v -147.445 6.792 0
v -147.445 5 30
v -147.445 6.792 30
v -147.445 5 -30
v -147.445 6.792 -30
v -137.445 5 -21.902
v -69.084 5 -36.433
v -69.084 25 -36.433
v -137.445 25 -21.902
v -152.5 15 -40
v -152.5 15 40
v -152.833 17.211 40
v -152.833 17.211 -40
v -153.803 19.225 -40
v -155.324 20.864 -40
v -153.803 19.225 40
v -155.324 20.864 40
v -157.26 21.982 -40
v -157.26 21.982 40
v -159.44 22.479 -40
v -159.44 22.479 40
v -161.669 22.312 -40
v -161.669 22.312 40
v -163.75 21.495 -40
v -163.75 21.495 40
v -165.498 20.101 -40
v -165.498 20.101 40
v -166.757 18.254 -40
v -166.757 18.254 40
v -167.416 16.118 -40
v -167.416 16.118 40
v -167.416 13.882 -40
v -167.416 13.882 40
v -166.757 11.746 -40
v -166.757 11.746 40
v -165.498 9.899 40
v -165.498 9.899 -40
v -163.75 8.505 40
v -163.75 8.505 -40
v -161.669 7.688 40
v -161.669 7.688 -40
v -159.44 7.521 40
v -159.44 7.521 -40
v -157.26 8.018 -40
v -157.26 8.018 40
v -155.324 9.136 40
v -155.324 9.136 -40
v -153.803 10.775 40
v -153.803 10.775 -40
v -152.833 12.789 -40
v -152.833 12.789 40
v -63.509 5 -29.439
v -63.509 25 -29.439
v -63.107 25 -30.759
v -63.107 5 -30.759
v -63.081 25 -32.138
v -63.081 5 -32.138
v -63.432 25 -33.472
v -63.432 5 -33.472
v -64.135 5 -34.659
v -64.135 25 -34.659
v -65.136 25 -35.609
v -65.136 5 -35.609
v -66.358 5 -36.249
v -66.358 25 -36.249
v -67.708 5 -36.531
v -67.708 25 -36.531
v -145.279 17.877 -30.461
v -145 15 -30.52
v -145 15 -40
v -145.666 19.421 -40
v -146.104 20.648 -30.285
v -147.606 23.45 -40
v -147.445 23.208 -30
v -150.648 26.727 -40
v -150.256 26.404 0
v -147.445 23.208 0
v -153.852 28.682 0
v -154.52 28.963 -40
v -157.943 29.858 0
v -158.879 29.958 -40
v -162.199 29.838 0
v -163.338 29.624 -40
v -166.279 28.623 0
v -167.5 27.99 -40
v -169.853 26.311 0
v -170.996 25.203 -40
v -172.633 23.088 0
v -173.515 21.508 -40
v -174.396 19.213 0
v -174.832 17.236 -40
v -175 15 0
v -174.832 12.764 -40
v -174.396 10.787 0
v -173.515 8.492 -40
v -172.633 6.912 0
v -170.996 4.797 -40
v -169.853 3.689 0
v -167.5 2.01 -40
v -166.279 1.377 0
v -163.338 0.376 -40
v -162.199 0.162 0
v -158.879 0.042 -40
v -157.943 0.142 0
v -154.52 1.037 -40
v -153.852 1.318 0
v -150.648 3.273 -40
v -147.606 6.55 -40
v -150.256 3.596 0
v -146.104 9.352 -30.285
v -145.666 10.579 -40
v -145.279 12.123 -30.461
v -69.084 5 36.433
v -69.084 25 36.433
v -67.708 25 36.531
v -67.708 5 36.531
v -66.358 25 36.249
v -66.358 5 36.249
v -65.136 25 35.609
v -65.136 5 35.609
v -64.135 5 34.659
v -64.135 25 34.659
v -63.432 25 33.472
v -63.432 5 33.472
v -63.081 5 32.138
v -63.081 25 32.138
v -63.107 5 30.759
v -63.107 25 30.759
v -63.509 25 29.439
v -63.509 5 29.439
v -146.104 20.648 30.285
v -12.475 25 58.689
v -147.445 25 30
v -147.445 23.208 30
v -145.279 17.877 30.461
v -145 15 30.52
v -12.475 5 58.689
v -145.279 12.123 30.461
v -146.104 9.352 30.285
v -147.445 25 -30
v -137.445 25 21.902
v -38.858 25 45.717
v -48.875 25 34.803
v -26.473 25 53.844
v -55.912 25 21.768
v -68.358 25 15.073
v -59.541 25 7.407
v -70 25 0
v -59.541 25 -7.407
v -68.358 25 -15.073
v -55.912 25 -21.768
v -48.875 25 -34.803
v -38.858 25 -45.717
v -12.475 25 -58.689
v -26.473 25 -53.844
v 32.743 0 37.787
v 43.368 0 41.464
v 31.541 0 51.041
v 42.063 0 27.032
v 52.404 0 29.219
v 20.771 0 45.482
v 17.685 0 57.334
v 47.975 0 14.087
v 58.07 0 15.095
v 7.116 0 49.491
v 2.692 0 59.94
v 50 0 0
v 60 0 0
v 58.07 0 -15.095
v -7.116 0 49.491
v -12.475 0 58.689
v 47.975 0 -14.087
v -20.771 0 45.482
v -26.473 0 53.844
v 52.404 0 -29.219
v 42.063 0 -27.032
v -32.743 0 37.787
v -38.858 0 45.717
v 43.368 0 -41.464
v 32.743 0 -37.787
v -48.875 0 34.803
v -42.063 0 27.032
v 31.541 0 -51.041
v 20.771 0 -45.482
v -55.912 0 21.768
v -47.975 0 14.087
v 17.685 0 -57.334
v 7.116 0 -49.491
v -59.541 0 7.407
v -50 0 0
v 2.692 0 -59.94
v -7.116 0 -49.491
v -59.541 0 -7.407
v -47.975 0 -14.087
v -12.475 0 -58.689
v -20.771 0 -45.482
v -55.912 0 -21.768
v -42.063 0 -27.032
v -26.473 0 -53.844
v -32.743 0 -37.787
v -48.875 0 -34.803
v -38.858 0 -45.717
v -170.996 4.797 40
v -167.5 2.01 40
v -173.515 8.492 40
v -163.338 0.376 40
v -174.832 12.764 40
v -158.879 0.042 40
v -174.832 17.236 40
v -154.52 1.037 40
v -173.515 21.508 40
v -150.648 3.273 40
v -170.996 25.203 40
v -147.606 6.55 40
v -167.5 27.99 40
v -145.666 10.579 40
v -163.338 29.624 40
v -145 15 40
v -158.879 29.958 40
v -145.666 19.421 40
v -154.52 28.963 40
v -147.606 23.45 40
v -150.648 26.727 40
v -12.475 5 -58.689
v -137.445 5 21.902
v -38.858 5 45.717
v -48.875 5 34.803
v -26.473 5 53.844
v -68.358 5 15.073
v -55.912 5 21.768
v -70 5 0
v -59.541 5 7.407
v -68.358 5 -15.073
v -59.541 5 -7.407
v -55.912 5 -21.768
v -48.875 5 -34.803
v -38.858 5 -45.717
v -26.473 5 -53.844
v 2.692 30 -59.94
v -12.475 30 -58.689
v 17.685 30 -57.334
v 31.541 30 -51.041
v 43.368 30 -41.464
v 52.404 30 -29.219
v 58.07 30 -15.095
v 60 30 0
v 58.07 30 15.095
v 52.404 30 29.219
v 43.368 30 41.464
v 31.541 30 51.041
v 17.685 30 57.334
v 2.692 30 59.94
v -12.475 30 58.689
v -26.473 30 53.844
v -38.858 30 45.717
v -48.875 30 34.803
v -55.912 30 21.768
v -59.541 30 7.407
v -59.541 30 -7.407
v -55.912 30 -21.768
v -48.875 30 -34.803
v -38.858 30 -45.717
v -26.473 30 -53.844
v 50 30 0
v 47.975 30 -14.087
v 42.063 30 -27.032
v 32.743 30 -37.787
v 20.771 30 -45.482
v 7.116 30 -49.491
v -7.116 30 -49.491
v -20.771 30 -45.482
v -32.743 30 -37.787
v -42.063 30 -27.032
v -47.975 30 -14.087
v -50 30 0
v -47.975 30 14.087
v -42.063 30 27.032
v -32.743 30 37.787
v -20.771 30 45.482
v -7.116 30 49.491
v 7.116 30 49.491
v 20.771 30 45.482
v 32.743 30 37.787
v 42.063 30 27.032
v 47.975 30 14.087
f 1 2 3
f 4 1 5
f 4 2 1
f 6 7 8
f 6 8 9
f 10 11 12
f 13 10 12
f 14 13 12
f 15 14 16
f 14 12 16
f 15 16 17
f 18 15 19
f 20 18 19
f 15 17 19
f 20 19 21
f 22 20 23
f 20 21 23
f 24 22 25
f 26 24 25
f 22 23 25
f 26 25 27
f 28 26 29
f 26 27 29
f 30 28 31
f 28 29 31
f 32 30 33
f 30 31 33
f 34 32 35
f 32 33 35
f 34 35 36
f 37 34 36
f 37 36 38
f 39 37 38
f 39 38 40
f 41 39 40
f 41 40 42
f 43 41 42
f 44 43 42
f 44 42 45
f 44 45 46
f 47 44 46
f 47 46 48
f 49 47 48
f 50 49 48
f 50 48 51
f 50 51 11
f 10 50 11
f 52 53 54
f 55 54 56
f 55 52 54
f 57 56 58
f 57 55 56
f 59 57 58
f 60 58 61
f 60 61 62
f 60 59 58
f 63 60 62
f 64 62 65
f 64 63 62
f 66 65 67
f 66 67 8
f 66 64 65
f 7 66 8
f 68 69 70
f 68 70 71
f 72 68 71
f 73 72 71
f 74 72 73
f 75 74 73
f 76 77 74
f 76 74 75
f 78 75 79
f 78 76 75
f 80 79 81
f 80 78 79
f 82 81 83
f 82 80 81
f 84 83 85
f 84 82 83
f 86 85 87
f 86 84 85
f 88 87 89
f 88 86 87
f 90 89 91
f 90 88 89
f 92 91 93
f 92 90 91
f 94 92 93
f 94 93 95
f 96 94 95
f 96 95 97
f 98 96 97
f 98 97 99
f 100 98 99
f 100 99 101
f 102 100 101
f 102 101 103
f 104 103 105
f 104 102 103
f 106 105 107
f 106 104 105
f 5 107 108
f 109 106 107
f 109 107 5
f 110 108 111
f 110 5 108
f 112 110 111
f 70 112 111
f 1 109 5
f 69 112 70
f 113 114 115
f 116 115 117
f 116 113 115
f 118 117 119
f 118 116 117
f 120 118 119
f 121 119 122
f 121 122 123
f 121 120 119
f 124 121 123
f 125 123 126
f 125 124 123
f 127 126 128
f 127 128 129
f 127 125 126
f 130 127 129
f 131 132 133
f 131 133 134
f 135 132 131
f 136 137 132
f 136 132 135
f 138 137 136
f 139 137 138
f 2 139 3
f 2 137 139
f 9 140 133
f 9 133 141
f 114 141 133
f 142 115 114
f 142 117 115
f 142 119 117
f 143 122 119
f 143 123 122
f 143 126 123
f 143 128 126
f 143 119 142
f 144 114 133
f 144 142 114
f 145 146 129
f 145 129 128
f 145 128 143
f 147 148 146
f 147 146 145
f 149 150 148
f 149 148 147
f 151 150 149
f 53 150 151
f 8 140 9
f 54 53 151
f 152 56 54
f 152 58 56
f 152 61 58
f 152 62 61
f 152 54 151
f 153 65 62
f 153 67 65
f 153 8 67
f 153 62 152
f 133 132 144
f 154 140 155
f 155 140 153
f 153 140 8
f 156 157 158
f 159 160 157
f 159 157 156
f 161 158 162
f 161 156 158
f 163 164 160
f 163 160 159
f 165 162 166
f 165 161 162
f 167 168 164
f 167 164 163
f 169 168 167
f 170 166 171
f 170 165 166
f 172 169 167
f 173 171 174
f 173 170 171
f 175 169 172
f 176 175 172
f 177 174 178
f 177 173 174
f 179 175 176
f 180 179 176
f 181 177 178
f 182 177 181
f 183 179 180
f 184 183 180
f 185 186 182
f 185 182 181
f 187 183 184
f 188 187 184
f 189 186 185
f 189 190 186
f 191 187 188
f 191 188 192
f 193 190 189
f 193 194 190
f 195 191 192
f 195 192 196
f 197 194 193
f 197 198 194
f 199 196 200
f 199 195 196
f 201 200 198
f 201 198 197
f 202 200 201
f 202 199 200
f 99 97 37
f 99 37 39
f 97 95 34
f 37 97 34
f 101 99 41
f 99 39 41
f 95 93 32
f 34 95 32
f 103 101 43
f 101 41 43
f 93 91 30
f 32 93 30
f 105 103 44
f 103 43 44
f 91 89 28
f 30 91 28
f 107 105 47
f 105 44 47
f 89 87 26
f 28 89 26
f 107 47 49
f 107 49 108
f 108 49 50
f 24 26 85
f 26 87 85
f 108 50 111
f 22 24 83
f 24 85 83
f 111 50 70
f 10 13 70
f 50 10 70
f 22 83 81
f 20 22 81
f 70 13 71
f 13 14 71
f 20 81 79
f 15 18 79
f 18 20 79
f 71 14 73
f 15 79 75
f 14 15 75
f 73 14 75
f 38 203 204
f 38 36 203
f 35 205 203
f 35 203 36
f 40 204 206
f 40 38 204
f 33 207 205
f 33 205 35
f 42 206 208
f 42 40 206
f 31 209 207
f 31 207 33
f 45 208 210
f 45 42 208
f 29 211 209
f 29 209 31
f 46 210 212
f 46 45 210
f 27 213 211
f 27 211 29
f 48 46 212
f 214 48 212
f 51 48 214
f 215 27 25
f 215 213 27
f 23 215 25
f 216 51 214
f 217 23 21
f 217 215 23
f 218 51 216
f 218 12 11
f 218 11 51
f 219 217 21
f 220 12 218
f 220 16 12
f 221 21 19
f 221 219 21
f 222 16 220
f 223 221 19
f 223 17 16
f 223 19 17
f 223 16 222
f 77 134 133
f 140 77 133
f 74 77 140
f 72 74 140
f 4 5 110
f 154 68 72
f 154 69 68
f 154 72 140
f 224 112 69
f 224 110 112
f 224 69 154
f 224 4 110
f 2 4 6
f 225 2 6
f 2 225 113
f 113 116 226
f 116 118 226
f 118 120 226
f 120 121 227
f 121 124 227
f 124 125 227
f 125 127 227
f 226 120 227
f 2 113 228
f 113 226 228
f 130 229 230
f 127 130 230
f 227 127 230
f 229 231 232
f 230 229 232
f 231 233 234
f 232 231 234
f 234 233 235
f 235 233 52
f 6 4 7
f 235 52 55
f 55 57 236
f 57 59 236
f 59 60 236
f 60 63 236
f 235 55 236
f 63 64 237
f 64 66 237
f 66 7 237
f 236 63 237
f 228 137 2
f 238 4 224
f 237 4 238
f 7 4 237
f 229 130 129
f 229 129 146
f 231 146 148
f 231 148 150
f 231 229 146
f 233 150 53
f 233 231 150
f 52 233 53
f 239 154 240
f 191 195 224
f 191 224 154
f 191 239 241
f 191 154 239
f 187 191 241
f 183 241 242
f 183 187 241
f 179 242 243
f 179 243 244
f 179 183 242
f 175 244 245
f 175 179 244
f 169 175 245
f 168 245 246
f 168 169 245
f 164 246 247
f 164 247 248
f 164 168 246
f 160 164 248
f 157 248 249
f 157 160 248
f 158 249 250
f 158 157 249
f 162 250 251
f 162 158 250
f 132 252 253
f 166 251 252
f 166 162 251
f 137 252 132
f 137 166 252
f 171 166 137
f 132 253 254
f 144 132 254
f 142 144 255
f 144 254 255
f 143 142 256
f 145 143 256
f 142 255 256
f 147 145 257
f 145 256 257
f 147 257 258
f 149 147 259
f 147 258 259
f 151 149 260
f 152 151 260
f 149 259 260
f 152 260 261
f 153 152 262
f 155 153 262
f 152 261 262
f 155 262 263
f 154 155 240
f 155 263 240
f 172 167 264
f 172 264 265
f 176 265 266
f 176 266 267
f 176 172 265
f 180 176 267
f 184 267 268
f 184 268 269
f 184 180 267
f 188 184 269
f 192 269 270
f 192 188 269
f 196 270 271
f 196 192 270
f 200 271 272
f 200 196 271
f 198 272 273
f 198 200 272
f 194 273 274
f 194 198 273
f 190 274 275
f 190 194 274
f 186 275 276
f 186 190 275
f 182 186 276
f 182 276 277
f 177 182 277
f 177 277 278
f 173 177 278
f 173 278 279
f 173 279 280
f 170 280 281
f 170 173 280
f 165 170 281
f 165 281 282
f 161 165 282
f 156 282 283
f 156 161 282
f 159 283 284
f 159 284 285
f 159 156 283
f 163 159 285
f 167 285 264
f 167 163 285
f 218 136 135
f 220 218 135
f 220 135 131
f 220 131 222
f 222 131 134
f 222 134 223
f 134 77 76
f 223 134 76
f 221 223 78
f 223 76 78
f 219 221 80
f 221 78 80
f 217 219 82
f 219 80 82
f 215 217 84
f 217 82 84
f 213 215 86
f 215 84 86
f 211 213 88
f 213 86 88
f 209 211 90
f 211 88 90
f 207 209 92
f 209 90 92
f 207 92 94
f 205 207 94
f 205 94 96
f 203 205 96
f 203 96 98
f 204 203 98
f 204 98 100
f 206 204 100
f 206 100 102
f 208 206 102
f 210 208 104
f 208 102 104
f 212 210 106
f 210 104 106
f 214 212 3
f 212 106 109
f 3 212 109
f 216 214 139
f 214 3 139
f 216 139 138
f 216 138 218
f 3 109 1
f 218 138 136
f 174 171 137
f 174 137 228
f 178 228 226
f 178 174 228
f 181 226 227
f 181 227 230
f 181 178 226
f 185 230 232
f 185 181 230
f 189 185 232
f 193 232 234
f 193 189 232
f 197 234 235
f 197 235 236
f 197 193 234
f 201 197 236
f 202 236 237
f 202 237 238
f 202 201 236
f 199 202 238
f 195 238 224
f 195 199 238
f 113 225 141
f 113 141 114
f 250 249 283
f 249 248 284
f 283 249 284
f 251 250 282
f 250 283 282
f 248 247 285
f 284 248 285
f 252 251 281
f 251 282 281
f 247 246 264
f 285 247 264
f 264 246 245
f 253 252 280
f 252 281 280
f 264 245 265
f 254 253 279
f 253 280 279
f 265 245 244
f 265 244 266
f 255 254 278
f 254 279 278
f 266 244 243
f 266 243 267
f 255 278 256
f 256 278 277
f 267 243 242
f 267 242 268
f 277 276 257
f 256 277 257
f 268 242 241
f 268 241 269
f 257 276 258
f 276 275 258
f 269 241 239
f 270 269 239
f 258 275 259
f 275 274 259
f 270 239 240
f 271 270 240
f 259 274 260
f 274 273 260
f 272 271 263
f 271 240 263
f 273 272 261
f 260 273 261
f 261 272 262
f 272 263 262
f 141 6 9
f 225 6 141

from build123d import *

# Parameters (mm, degrees)
CROQUIS2_R              = 50
SALIENTE_EXTRUIR3_DEPTH = 30
CORTAR_EXTRUIR1_DEPTH   = 5
CORTAR_EXTRUIR2_DEPTH   = 5
CROQUIS7_R              = 15
SALIENTE_EXTRUIR4_DEPTH = 40
CROQUIS7_2_R            = 15
SALIENTE_EXTRUIR5_DEPTH = 40
CROQUIS8_R              = 7.5
CORTAR_EXTRUIR3_DEPTH   = 101


with BuildPart() as part:
    # Croquis2 → Saliente-Extruir3 (new body)
    with BuildSketch(Plane(origin=(0, 0, 0), x_dir=(1, 0, 0), z_dir=(0, 1, 0))):
        with BuildLine():
            Line((-147.4451574, 30), (-12.474701449, 58.688856044))
            ThreePointArc((-12.474701449, 58.688856044), (60, 0), (-12.474701449, -58.688856044))
            Line((-12.474701449, -58.688856044), (-147.4451574, -30))
            Line((-147.4451574, -30), (-147.4451574, 30))
        make_face()
        Circle(CROQUIS2_R, mode=Mode.SUBTRACT)
        with BuildLine():
            Line((-137.4451574, -21.902159668), (-69.084440585, -36.432678588))
            ThreePointArc((-69.084440585, -36.432678588), (-64.13537775, -34.658954459), (-63.508556655, -29.439144545))
            ThreePointArc((-63.508556655, -29.439144545), (-70, 0), (-63.508556655, 29.439144545))
            ThreePointArc((-63.508556655, 29.439144545), (-64.13537775, 34.658954459), (-69.084440585, 36.432678588))
            Line((-69.084440585, 36.432678588), (-137.4451574, 21.902159668))
            Line((-137.4451574, 21.902159668), (-137.4451574, -21.902159668))
        make_face(mode=Mode.SUBTRACT)
    extrude(amount=SALIENTE_EXTRUIR3_DEPTH)

    # Croquis4 → Cortar-Extruir1 (cut)
    with BuildSketch(Plane(origin=(0, 0, 0), x_dir=(1, 0, 0), z_dir=(0, 1, 0))):
        with BuildLine():
            Line((-147.4451574, -30), (-12.474701449, -58.688856044))
            ThreePointArc((-12.474701449, -58.688856044), (-60, 0), (-12.474701449, 58.688856044))
            Line((-12.474701449, 58.688856044), (-147.4451574, 30))
            Line((-147.4451574, 30), (-147.4451574, -30))
        make_face()
        with BuildLine():
            Line((-69.084440585, 36.432678588), (-137.4451574, 21.902159668))
            Line((-137.4451574, 21.902159668), (-137.4451574, -21.902159668))
            Line((-137.4451574, -21.902159668), (-69.084440585, -36.432678588))
            ThreePointArc((-69.084440585, -36.432678588), (-64.13537775, -34.658954459), (-63.508556655, -29.439144545))
            ThreePointArc((-63.508556655, -29.439144545), (-70, 0), (-63.508556655, 29.439144545))
            ThreePointArc((-63.508556655, 29.439144545), (-64.13537775, 34.658954459), (-69.084440585, 36.432678588))
        make_face(mode=Mode.SUBTRACT)
    extrude(amount=CORTAR_EXTRUIR1_DEPTH, mode=Mode.SUBTRACT)

    # Croquis5 → Cortar-Extruir2 (cut)
    with BuildSketch(Plane(origin=(0, 30, 0), x_dir=(1, 0, 0), z_dir=(0, 1, 0))):
        with BuildLine():
            Line((-147.4451574, 30), (-147.4451574, -30))
            Line((-147.4451574, -30), (-12.474701449, -58.688856044))
            ThreePointArc((-12.474701449, -58.688856044), (-60, 0), (-12.474701449, 58.688856044))
            Line((-12.474701449, 58.688856044), (-147.4451574, 30))
        make_face()
        with BuildLine():
            Line((-137.4451574, -21.902159668), (-69.084440585, -36.432678588))
            ThreePointArc((-69.084440585, -36.432678588), (-64.13537775, -34.658954459), (-63.508556655, -29.439144545))
            ThreePointArc((-63.508556655, -29.439144545), (-70, 0), (-63.508556655, 29.439144545))
            ThreePointArc((-63.508556655, 29.439144545), (-64.13537775, 34.658954459), (-69.084440585, 36.432678588))
            Line((-69.084440585, 36.432678588), (-137.4451574, 21.902159668))
            Line((-137.4451574, 21.902159668), (-137.4451574, -21.902159668))
        make_face(mode=Mode.SUBTRACT)
    extrude(amount=-CORTAR_EXTRUIR2_DEPTH, mode=Mode.SUBTRACT)

    # Croquis7 → Saliente-Extruir4 (add)
    with BuildSketch(Plane.XY):
        with Locations((-160, 15)):
            Circle(CROQUIS7_R)
    extrude(amount=SALIENTE_EXTRUIR4_DEPTH)

    # Croquis7<2> → Saliente-Extruir5 (add)
    with BuildSketch(Plane.XY):
        with Locations((-160, 15)):
            Circle(CROQUIS7_2_R)
    extrude(amount=-SALIENTE_EXTRUIR5_DEPTH)

    # Croquis8 → Cortar-Extruir3 (cut, through all)
    with BuildSketch(Plane.XY.offset(40)):
        with Locations((-160, 15)):
            Circle(CROQUIS8_R)
    extrude(amount=-CORTAR_EXTRUIR3_DEPTH, mode=Mode.SUBTRACT)


solid = part.part
